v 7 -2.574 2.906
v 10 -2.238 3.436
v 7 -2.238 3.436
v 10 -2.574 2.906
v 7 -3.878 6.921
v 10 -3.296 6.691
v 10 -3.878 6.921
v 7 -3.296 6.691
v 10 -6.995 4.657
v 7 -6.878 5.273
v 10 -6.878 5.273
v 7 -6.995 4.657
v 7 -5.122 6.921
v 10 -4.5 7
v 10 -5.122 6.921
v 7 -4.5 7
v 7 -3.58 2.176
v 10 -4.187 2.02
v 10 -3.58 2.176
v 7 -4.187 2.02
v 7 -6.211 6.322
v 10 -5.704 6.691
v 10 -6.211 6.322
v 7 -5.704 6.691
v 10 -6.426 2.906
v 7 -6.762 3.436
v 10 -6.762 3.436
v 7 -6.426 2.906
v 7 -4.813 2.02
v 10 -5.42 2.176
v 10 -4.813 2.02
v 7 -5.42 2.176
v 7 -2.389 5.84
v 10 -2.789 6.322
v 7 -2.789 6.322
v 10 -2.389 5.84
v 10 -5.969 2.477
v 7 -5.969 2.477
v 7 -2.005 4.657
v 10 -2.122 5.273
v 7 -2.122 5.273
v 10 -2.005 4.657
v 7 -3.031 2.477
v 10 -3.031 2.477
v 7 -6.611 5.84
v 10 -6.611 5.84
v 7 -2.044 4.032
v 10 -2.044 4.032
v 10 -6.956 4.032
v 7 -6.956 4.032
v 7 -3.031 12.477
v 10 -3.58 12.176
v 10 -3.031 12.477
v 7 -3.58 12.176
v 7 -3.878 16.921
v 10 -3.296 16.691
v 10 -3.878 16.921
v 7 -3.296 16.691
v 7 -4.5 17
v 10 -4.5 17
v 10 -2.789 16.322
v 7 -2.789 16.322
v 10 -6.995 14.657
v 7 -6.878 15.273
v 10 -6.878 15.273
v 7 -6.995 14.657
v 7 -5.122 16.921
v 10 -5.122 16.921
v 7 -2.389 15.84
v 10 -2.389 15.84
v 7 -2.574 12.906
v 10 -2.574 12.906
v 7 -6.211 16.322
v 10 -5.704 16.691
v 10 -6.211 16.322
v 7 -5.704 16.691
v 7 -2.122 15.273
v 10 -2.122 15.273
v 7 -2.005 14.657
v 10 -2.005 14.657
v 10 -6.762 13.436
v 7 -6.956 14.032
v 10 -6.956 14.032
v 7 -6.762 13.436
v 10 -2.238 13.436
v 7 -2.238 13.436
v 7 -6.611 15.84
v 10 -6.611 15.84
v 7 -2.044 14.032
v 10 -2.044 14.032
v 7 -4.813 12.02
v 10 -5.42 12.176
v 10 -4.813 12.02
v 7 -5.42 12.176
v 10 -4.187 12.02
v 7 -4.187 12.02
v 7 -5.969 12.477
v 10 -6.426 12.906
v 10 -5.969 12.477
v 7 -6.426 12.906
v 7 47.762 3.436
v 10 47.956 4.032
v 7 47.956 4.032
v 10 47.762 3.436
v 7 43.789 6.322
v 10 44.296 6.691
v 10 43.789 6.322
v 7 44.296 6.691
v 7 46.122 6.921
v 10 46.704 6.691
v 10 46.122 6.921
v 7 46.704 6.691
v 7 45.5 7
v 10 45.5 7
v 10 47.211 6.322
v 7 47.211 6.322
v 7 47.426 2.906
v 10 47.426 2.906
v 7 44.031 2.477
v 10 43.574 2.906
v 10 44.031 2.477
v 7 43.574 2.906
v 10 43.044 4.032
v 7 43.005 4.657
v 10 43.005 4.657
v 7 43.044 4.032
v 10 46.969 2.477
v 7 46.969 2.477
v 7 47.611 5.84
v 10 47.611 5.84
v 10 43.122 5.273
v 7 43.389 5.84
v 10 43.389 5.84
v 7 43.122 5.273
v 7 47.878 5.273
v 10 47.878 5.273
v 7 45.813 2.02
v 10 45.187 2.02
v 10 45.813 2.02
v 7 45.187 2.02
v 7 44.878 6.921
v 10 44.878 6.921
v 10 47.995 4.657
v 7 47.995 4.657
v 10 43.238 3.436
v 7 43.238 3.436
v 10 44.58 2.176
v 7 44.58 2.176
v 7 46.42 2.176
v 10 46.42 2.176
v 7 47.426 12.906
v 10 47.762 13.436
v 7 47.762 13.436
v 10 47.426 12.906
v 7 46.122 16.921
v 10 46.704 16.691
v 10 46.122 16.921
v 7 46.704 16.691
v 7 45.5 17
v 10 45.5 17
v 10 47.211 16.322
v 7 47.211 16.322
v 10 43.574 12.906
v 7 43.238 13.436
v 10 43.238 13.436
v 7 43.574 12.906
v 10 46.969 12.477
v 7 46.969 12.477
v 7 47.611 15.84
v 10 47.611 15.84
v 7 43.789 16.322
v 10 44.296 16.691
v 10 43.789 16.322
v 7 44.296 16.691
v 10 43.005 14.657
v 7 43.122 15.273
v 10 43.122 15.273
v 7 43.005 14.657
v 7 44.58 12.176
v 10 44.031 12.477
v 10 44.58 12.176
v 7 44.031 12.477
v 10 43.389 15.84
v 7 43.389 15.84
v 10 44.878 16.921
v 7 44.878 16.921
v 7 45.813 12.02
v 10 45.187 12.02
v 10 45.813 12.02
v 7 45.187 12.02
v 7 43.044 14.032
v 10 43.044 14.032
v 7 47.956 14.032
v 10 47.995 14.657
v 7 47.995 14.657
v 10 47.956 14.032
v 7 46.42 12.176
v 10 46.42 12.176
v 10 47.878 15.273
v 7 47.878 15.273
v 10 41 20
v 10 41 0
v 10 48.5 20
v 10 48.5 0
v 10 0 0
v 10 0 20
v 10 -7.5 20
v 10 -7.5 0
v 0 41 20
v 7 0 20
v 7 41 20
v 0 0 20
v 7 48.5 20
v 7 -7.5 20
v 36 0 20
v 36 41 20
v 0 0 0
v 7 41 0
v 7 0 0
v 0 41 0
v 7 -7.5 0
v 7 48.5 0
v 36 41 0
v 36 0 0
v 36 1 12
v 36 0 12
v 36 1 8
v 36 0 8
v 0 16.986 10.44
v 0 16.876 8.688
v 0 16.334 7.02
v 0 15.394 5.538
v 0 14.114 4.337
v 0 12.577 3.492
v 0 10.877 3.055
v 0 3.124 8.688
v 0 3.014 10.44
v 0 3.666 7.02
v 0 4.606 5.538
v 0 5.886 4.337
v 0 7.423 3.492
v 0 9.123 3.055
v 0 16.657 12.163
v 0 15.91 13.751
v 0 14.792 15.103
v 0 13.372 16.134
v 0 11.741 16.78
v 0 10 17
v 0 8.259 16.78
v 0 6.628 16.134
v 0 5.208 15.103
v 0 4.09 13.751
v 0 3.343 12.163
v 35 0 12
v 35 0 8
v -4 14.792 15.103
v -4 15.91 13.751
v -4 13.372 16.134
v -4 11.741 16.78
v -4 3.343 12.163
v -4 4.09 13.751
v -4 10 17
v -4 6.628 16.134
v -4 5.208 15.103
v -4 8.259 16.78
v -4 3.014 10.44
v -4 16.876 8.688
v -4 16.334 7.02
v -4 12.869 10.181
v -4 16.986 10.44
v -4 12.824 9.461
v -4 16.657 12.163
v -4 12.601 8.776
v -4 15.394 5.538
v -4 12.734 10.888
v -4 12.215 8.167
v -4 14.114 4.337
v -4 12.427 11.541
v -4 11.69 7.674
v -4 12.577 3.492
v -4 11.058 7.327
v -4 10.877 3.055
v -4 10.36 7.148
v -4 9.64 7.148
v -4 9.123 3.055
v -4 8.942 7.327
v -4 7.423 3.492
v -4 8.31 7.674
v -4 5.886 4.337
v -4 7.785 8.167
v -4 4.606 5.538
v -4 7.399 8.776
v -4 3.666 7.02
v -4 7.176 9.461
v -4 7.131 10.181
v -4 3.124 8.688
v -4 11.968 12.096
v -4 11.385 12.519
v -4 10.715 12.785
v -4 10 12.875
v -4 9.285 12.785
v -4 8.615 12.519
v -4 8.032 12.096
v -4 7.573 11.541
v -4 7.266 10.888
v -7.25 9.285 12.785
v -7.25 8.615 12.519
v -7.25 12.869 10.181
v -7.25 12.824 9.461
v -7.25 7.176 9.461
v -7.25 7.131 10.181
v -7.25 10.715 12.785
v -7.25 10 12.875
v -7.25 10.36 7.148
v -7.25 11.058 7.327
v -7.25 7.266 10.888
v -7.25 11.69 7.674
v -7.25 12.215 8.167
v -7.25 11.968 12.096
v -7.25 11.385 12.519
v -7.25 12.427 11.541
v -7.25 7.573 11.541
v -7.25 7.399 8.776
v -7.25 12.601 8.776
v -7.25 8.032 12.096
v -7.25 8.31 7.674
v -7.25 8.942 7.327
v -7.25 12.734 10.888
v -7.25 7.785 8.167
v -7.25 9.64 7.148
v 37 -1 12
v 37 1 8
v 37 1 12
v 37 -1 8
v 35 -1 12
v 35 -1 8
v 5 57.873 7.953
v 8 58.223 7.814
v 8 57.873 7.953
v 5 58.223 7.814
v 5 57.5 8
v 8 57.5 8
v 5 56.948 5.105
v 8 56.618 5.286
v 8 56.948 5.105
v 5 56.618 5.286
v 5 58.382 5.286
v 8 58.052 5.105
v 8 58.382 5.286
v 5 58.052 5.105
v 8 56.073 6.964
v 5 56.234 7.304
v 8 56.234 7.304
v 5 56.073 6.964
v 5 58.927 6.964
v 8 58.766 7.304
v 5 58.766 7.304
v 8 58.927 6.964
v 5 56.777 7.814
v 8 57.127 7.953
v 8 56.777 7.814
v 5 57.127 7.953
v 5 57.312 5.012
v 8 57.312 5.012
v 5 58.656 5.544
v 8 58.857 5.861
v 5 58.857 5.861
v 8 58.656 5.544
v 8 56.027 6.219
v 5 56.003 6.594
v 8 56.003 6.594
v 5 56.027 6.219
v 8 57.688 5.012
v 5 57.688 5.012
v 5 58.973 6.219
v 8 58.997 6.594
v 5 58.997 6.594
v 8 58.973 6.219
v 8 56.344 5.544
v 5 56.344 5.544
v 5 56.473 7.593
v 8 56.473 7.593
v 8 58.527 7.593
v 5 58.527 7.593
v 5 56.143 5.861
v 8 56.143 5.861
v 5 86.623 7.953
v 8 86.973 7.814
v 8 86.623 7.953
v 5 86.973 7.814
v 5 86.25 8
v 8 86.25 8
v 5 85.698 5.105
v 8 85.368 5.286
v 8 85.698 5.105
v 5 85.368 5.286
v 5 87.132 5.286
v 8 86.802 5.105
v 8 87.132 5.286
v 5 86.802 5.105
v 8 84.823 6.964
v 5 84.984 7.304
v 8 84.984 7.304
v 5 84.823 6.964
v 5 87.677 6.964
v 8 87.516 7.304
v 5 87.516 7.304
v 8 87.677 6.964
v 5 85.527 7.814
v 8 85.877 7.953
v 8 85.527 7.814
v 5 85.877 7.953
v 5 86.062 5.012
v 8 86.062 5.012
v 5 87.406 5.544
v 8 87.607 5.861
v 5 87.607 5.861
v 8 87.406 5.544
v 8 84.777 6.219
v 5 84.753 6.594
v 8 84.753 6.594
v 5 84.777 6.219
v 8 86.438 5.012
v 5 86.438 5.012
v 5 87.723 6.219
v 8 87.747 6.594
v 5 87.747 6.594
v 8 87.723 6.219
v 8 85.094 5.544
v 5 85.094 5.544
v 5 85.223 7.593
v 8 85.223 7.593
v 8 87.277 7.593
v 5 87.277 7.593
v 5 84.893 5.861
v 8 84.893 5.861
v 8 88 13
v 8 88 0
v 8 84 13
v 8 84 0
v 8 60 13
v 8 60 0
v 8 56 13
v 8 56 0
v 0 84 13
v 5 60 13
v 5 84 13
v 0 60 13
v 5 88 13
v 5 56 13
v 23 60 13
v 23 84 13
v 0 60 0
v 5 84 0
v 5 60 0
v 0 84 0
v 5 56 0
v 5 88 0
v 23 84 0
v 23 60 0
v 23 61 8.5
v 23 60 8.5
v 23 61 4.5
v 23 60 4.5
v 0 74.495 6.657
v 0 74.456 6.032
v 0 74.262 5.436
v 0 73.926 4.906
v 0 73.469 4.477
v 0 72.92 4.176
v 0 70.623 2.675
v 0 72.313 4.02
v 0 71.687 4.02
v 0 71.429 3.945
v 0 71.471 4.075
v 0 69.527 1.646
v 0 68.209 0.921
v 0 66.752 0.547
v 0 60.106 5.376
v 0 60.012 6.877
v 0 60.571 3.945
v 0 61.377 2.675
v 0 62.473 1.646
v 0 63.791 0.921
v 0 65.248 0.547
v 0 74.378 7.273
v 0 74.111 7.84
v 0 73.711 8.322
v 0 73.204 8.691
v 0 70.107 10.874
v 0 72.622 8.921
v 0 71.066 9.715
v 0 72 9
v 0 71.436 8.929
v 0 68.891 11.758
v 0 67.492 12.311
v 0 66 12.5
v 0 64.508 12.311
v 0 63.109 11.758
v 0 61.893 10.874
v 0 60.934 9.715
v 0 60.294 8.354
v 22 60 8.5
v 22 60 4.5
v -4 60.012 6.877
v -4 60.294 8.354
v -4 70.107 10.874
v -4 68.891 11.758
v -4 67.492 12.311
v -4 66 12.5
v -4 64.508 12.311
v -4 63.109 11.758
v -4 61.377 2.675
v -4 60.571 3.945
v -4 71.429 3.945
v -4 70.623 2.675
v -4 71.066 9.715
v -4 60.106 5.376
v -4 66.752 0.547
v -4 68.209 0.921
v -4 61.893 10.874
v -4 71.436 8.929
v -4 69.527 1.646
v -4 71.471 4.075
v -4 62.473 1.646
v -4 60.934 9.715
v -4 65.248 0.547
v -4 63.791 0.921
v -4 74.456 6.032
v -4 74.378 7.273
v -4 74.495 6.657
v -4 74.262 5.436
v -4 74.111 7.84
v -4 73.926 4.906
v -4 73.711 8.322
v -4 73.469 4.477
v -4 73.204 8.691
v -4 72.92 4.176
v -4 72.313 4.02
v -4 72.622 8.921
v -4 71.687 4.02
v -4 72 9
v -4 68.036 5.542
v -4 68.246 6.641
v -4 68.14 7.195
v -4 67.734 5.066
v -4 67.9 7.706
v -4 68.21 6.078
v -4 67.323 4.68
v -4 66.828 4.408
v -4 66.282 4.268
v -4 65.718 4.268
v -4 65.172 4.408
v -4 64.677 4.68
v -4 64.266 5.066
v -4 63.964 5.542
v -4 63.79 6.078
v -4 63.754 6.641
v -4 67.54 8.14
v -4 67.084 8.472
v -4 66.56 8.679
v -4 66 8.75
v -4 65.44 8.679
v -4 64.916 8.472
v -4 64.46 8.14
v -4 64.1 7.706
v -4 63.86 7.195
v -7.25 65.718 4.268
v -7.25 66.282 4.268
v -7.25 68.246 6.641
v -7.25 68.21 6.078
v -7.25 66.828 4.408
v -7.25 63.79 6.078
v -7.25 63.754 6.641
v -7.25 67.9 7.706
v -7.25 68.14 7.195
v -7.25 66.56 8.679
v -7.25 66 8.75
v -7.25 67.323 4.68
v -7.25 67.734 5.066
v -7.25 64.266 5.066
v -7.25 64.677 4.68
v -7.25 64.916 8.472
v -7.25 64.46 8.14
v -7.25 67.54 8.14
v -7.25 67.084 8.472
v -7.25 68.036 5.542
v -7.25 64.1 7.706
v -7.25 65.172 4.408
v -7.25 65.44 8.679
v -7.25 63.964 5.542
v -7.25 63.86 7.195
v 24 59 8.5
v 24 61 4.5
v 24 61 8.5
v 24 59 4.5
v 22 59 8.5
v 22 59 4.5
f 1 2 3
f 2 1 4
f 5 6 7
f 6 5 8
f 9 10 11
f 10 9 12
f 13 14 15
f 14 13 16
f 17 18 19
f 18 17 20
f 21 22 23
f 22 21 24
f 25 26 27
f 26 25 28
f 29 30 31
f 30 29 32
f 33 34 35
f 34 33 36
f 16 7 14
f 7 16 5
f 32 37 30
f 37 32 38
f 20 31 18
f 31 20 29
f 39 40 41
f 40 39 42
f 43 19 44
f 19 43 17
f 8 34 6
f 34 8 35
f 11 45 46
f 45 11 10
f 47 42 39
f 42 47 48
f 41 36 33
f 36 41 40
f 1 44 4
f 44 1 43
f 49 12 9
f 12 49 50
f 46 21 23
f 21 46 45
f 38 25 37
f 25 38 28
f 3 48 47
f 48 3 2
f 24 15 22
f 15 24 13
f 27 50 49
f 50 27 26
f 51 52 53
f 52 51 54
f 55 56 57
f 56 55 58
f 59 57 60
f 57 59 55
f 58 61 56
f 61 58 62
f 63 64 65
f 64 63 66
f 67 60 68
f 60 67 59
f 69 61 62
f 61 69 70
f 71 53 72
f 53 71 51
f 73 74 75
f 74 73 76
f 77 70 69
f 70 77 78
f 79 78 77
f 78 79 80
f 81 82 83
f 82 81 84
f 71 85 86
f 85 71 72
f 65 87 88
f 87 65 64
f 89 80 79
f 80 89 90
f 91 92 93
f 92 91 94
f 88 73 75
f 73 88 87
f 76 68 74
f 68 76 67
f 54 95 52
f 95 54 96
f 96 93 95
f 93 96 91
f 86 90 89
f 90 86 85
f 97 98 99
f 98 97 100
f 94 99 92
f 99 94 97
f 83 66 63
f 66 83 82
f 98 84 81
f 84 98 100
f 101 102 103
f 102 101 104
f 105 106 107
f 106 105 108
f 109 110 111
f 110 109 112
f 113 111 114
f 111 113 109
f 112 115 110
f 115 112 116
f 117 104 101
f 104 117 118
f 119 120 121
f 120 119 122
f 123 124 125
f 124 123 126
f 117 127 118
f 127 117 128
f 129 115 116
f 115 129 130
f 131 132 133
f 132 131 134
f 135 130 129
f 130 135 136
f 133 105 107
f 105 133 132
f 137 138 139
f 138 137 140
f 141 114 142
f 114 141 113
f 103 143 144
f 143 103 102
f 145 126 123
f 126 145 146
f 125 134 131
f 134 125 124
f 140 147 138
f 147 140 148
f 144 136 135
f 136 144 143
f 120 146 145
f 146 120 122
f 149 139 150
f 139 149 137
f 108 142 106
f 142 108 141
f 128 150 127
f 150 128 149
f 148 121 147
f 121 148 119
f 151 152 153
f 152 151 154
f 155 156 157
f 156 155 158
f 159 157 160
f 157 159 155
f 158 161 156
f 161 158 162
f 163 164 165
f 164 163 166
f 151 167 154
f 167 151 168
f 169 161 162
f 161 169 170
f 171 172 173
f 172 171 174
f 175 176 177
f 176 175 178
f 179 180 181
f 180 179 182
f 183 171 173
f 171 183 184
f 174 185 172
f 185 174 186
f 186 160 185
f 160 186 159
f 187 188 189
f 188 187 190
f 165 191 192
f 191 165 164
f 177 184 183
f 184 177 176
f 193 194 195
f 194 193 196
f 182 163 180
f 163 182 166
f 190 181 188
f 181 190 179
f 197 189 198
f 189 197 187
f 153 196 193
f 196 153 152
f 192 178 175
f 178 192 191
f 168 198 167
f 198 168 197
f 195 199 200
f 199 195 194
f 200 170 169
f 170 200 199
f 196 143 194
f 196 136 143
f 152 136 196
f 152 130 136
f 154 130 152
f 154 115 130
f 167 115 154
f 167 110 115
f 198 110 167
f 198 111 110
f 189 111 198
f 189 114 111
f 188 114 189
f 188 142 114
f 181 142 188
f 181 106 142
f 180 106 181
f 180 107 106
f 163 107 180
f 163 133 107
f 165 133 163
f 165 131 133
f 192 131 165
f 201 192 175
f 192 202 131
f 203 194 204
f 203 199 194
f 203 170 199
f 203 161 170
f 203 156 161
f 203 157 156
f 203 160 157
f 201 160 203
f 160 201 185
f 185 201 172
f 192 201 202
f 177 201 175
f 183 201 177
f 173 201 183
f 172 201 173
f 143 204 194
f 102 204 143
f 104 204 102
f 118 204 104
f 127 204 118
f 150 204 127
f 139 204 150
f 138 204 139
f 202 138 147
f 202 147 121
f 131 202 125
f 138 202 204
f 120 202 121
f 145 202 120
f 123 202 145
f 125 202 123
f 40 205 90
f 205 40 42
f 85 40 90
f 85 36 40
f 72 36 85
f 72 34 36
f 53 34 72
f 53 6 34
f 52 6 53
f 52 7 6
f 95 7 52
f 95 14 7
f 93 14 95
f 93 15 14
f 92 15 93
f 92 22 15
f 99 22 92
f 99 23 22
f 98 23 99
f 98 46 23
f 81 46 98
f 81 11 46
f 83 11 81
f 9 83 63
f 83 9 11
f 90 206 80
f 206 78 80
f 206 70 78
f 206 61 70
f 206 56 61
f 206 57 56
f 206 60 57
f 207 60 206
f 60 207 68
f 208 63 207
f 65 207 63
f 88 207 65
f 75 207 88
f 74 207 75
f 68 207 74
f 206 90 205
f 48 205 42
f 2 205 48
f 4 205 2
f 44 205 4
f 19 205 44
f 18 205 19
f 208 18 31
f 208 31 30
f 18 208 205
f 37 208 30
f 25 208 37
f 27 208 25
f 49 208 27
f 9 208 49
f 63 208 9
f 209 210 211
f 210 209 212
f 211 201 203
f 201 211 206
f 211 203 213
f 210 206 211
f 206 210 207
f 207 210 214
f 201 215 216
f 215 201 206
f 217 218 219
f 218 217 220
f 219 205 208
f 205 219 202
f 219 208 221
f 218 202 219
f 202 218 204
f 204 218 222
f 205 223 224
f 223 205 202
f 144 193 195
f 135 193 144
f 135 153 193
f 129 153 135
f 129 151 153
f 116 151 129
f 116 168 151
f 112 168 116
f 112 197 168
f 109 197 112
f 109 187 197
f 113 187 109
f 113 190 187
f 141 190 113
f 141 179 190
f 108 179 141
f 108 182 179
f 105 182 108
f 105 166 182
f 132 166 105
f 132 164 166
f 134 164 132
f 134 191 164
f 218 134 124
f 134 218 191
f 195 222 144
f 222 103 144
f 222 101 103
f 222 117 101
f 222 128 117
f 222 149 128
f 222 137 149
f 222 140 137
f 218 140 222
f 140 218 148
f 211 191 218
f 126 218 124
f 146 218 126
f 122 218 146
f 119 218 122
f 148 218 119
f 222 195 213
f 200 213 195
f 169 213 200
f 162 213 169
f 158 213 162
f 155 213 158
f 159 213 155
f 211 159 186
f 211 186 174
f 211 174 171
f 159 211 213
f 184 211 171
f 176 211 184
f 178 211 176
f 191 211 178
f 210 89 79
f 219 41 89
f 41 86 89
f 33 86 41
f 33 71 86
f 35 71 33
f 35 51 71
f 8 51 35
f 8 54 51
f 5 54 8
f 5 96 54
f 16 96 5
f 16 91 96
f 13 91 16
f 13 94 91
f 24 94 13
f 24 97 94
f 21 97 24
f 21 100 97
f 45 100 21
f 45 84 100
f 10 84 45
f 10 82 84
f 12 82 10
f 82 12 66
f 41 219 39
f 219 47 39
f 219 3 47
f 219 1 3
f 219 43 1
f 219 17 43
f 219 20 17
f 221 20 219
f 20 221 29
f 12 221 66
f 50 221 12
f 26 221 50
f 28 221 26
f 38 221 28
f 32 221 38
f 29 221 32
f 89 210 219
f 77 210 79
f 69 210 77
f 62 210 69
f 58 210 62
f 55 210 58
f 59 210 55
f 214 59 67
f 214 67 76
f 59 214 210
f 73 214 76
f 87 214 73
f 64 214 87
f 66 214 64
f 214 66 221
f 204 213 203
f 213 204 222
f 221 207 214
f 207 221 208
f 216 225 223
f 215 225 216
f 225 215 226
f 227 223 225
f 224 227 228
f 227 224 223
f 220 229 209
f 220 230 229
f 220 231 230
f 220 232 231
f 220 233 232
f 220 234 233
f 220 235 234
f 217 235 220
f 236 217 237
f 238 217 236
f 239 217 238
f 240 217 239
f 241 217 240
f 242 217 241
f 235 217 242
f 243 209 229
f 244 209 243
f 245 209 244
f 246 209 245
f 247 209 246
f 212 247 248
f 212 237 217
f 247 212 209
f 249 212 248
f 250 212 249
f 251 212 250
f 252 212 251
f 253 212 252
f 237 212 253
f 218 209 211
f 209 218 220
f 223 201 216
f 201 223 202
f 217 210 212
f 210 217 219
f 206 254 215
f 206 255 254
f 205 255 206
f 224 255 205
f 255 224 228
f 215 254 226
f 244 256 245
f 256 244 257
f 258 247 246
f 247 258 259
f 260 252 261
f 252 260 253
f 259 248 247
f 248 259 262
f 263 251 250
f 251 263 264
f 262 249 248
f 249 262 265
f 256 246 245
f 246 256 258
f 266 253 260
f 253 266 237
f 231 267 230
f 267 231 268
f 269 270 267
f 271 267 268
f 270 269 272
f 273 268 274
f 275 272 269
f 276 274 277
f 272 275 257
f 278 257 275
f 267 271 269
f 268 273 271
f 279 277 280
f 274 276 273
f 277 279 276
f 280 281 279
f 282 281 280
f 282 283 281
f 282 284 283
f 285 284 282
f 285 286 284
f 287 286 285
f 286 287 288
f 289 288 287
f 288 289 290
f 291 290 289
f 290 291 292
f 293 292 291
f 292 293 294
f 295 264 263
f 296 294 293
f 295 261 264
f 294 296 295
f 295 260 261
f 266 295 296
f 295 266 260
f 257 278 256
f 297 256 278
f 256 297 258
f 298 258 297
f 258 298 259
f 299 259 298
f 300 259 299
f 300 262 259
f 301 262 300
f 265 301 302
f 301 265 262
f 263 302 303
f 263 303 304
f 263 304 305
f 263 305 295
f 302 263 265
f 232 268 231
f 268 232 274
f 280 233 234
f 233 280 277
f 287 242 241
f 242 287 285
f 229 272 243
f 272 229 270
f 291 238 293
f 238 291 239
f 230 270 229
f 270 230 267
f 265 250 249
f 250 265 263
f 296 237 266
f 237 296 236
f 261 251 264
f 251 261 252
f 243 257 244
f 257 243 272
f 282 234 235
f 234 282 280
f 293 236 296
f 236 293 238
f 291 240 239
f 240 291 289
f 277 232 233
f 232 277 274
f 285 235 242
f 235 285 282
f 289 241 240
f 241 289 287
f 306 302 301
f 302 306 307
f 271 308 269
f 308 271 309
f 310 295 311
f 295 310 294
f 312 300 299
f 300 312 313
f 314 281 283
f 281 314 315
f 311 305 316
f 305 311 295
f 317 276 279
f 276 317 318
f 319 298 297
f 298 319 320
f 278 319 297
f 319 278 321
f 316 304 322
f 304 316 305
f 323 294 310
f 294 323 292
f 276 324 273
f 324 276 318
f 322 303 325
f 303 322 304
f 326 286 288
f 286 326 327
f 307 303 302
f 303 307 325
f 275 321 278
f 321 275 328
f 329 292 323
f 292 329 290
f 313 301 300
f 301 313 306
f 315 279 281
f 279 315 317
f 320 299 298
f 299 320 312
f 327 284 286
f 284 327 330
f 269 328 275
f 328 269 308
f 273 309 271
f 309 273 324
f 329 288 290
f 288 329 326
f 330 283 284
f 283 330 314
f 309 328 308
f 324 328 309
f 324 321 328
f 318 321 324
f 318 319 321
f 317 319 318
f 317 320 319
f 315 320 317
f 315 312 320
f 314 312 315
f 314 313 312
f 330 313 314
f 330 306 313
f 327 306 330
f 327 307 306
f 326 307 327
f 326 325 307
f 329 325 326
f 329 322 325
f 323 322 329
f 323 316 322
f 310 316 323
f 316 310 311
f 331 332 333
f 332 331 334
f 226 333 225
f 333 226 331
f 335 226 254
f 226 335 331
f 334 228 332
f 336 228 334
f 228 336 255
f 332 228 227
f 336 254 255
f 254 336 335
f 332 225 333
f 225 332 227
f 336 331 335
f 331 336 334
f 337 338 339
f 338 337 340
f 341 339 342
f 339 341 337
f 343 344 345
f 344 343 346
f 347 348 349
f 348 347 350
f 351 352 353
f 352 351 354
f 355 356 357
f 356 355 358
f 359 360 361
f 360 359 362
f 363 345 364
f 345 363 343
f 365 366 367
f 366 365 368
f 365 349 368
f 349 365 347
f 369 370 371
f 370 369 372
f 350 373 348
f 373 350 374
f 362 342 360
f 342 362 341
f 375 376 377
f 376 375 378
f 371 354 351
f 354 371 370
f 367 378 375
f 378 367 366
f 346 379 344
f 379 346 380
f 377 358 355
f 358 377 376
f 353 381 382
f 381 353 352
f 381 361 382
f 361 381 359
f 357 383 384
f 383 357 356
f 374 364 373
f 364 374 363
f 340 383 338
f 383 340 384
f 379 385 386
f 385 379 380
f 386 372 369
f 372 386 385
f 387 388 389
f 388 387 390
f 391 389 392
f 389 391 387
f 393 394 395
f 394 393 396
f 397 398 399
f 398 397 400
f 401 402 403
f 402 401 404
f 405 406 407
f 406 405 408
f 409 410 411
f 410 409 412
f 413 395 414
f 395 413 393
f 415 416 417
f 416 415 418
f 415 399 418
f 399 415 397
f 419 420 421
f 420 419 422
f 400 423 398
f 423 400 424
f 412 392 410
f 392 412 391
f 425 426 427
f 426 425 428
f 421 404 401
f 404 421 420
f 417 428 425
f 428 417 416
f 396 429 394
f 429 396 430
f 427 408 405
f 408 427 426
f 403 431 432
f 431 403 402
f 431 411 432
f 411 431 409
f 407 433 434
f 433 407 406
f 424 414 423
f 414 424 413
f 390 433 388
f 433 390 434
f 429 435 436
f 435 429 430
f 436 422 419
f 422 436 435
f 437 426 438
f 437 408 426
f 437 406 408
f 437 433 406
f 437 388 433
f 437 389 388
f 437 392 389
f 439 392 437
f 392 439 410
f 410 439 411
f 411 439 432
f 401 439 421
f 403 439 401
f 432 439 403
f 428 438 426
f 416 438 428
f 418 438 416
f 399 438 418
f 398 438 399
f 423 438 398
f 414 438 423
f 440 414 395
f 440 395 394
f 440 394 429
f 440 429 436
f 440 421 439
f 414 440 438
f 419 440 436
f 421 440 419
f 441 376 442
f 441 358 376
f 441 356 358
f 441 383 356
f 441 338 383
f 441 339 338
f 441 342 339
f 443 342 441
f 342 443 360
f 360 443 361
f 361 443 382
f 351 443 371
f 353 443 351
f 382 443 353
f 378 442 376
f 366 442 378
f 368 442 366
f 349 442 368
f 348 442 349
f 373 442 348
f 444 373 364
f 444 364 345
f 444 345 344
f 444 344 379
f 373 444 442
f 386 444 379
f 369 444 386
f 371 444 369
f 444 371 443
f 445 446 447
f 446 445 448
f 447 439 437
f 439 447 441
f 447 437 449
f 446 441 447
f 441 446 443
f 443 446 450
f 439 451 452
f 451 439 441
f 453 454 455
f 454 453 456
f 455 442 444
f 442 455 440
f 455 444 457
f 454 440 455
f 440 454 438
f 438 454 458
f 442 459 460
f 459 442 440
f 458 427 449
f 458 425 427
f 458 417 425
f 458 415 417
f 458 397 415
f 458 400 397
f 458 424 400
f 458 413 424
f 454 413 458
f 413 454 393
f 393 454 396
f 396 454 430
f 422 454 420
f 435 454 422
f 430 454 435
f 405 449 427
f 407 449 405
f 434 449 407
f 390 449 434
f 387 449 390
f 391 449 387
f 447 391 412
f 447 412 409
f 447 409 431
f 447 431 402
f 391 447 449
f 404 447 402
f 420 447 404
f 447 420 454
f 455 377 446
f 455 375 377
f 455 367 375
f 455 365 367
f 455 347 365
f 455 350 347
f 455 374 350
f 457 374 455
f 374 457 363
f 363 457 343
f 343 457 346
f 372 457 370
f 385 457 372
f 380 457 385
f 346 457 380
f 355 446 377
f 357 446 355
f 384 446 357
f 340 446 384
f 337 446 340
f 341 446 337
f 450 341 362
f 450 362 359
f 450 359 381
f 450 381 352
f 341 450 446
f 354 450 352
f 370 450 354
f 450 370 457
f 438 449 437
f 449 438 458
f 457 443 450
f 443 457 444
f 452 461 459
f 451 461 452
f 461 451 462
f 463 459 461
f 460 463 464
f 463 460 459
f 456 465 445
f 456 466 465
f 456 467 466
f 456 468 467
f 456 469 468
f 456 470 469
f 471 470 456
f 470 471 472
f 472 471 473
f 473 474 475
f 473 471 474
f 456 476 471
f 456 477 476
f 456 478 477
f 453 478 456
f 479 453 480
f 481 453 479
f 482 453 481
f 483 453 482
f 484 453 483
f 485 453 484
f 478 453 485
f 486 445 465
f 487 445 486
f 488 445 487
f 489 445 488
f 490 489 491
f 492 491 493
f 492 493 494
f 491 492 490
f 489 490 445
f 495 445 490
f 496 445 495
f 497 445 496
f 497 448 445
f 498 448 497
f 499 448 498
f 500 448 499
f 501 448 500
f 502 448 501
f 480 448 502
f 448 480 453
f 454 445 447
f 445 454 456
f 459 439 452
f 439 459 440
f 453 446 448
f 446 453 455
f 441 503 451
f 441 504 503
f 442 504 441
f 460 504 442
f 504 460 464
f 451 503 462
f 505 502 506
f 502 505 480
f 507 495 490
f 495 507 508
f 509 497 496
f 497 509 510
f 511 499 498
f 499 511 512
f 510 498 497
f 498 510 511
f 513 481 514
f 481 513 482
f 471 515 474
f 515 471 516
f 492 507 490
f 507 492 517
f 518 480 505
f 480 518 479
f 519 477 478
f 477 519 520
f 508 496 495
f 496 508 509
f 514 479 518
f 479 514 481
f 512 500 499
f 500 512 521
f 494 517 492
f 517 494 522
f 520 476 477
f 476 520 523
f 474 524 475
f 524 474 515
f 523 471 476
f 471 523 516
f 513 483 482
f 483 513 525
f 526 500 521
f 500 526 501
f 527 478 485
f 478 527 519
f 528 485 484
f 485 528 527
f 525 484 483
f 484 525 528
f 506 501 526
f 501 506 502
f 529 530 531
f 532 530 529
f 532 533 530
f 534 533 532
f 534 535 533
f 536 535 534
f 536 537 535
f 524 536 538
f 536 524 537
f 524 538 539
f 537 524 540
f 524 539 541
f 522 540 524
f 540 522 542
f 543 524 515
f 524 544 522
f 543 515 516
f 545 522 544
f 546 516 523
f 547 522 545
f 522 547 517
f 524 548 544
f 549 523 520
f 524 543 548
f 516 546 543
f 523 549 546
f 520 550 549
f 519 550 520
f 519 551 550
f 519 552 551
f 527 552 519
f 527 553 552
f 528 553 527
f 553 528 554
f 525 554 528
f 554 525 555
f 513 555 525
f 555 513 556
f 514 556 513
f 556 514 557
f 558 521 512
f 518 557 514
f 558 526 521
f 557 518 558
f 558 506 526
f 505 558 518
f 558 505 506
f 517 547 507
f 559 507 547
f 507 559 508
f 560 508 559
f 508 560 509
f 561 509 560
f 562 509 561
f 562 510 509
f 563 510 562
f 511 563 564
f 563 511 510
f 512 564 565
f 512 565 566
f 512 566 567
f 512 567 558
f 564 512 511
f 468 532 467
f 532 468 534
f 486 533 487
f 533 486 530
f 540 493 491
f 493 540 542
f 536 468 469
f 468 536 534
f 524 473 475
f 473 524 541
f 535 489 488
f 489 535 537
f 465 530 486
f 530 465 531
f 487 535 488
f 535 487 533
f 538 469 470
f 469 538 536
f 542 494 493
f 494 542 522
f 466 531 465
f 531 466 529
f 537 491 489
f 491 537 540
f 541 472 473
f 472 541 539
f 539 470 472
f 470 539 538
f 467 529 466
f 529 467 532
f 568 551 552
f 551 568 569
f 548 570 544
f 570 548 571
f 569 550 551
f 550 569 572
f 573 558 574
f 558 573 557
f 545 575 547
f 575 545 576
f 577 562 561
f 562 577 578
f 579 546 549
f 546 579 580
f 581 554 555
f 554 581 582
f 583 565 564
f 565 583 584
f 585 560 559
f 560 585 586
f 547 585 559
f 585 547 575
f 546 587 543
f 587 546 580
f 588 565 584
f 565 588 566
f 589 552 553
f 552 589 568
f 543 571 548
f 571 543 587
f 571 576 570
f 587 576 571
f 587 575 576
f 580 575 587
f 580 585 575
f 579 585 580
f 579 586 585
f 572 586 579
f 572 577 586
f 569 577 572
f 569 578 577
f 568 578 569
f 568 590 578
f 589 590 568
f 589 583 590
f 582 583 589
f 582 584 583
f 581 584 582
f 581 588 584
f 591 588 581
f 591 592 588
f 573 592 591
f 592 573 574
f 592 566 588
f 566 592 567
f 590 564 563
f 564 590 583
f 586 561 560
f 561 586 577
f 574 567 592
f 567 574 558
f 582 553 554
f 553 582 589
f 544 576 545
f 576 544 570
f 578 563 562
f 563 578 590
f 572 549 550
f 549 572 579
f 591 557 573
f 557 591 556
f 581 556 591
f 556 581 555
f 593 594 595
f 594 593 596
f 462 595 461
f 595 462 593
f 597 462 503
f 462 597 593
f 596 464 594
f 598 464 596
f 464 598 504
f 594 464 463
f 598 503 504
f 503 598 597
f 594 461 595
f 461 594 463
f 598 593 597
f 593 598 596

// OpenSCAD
servo();

translate([0, 60])
micro_servo();

module micro_servo() {
    body();
    output_shaft();
    cable();

    height = 13;
    depth = 23;

    module body() {
        $fn = 25;

        cube([depth, 24, height]);

        difference() {
            offset = 5;
            translate([offset, -(32-24)/2])
            cube([3, 32, height]);

            translate([offset+3+0.5, -2.5, height/2])
            rotate([0, -90])
            union() {
                cylinder(h = 4, d = 3);
                translate([0, 28.75])
                cylinder(h = 4, d = 3);
            }
        }

        translate([0, 12/2, height/2])
        rotate([0, -90])
        cylinder(h = 4, d = 12);

        translate([0, 12, height/2])
        rotate([0, -90])
        cylinder(h = 4, d = 5);
    }

    module output_shaft() {
        $fn = 25;
        translate([-4, 12/2, height/2])
        rotate([0, -90])
        cylinder(h = 3.25, d = 4.5);
    }

    module cable() {
        translate([depth-1, -1, height/2 - 4/2])
        cube([2, 2, 4]);
    }
}

module servo() {
    body();
    output_shaft();
    cable();

    height = 20;
    depth = 36;

    module body() {
        $fn = 25;

        cube([depth, 41, height]);

        difference() {
            offset = 7;
            translate([offset, -(56-41)/2])
            cube([3, 56, height]);

            translate([offset+3+0.5, -4.5, 2+5/2])
            rotate([0, -90])
            union() {
                cylinder(h = 4, d = 5);

                translate([10, 0, 0])
                cylinder(h = 4, d = 5);

                translate([0, 50])
                cylinder(h = 4, d = 5);

                translate([10, 50])
                cylinder(h = 4, d = 5);
            }
        }

        translate([0, 10, height/2])
        rotate([0, -90])
        cylinder(h = 4, d = 14);
    }

    module output_shaft() {
        $fn = 25;
        translate([-4, 10, height/2])
        rotate([0, -90])
        cylinder(h = 3.25, d = 5.75);
    }

    module cable() {
        translate([depth-1, -1, height/2 - 4/2])
        cube([2, 2, 4]);
    }
}
